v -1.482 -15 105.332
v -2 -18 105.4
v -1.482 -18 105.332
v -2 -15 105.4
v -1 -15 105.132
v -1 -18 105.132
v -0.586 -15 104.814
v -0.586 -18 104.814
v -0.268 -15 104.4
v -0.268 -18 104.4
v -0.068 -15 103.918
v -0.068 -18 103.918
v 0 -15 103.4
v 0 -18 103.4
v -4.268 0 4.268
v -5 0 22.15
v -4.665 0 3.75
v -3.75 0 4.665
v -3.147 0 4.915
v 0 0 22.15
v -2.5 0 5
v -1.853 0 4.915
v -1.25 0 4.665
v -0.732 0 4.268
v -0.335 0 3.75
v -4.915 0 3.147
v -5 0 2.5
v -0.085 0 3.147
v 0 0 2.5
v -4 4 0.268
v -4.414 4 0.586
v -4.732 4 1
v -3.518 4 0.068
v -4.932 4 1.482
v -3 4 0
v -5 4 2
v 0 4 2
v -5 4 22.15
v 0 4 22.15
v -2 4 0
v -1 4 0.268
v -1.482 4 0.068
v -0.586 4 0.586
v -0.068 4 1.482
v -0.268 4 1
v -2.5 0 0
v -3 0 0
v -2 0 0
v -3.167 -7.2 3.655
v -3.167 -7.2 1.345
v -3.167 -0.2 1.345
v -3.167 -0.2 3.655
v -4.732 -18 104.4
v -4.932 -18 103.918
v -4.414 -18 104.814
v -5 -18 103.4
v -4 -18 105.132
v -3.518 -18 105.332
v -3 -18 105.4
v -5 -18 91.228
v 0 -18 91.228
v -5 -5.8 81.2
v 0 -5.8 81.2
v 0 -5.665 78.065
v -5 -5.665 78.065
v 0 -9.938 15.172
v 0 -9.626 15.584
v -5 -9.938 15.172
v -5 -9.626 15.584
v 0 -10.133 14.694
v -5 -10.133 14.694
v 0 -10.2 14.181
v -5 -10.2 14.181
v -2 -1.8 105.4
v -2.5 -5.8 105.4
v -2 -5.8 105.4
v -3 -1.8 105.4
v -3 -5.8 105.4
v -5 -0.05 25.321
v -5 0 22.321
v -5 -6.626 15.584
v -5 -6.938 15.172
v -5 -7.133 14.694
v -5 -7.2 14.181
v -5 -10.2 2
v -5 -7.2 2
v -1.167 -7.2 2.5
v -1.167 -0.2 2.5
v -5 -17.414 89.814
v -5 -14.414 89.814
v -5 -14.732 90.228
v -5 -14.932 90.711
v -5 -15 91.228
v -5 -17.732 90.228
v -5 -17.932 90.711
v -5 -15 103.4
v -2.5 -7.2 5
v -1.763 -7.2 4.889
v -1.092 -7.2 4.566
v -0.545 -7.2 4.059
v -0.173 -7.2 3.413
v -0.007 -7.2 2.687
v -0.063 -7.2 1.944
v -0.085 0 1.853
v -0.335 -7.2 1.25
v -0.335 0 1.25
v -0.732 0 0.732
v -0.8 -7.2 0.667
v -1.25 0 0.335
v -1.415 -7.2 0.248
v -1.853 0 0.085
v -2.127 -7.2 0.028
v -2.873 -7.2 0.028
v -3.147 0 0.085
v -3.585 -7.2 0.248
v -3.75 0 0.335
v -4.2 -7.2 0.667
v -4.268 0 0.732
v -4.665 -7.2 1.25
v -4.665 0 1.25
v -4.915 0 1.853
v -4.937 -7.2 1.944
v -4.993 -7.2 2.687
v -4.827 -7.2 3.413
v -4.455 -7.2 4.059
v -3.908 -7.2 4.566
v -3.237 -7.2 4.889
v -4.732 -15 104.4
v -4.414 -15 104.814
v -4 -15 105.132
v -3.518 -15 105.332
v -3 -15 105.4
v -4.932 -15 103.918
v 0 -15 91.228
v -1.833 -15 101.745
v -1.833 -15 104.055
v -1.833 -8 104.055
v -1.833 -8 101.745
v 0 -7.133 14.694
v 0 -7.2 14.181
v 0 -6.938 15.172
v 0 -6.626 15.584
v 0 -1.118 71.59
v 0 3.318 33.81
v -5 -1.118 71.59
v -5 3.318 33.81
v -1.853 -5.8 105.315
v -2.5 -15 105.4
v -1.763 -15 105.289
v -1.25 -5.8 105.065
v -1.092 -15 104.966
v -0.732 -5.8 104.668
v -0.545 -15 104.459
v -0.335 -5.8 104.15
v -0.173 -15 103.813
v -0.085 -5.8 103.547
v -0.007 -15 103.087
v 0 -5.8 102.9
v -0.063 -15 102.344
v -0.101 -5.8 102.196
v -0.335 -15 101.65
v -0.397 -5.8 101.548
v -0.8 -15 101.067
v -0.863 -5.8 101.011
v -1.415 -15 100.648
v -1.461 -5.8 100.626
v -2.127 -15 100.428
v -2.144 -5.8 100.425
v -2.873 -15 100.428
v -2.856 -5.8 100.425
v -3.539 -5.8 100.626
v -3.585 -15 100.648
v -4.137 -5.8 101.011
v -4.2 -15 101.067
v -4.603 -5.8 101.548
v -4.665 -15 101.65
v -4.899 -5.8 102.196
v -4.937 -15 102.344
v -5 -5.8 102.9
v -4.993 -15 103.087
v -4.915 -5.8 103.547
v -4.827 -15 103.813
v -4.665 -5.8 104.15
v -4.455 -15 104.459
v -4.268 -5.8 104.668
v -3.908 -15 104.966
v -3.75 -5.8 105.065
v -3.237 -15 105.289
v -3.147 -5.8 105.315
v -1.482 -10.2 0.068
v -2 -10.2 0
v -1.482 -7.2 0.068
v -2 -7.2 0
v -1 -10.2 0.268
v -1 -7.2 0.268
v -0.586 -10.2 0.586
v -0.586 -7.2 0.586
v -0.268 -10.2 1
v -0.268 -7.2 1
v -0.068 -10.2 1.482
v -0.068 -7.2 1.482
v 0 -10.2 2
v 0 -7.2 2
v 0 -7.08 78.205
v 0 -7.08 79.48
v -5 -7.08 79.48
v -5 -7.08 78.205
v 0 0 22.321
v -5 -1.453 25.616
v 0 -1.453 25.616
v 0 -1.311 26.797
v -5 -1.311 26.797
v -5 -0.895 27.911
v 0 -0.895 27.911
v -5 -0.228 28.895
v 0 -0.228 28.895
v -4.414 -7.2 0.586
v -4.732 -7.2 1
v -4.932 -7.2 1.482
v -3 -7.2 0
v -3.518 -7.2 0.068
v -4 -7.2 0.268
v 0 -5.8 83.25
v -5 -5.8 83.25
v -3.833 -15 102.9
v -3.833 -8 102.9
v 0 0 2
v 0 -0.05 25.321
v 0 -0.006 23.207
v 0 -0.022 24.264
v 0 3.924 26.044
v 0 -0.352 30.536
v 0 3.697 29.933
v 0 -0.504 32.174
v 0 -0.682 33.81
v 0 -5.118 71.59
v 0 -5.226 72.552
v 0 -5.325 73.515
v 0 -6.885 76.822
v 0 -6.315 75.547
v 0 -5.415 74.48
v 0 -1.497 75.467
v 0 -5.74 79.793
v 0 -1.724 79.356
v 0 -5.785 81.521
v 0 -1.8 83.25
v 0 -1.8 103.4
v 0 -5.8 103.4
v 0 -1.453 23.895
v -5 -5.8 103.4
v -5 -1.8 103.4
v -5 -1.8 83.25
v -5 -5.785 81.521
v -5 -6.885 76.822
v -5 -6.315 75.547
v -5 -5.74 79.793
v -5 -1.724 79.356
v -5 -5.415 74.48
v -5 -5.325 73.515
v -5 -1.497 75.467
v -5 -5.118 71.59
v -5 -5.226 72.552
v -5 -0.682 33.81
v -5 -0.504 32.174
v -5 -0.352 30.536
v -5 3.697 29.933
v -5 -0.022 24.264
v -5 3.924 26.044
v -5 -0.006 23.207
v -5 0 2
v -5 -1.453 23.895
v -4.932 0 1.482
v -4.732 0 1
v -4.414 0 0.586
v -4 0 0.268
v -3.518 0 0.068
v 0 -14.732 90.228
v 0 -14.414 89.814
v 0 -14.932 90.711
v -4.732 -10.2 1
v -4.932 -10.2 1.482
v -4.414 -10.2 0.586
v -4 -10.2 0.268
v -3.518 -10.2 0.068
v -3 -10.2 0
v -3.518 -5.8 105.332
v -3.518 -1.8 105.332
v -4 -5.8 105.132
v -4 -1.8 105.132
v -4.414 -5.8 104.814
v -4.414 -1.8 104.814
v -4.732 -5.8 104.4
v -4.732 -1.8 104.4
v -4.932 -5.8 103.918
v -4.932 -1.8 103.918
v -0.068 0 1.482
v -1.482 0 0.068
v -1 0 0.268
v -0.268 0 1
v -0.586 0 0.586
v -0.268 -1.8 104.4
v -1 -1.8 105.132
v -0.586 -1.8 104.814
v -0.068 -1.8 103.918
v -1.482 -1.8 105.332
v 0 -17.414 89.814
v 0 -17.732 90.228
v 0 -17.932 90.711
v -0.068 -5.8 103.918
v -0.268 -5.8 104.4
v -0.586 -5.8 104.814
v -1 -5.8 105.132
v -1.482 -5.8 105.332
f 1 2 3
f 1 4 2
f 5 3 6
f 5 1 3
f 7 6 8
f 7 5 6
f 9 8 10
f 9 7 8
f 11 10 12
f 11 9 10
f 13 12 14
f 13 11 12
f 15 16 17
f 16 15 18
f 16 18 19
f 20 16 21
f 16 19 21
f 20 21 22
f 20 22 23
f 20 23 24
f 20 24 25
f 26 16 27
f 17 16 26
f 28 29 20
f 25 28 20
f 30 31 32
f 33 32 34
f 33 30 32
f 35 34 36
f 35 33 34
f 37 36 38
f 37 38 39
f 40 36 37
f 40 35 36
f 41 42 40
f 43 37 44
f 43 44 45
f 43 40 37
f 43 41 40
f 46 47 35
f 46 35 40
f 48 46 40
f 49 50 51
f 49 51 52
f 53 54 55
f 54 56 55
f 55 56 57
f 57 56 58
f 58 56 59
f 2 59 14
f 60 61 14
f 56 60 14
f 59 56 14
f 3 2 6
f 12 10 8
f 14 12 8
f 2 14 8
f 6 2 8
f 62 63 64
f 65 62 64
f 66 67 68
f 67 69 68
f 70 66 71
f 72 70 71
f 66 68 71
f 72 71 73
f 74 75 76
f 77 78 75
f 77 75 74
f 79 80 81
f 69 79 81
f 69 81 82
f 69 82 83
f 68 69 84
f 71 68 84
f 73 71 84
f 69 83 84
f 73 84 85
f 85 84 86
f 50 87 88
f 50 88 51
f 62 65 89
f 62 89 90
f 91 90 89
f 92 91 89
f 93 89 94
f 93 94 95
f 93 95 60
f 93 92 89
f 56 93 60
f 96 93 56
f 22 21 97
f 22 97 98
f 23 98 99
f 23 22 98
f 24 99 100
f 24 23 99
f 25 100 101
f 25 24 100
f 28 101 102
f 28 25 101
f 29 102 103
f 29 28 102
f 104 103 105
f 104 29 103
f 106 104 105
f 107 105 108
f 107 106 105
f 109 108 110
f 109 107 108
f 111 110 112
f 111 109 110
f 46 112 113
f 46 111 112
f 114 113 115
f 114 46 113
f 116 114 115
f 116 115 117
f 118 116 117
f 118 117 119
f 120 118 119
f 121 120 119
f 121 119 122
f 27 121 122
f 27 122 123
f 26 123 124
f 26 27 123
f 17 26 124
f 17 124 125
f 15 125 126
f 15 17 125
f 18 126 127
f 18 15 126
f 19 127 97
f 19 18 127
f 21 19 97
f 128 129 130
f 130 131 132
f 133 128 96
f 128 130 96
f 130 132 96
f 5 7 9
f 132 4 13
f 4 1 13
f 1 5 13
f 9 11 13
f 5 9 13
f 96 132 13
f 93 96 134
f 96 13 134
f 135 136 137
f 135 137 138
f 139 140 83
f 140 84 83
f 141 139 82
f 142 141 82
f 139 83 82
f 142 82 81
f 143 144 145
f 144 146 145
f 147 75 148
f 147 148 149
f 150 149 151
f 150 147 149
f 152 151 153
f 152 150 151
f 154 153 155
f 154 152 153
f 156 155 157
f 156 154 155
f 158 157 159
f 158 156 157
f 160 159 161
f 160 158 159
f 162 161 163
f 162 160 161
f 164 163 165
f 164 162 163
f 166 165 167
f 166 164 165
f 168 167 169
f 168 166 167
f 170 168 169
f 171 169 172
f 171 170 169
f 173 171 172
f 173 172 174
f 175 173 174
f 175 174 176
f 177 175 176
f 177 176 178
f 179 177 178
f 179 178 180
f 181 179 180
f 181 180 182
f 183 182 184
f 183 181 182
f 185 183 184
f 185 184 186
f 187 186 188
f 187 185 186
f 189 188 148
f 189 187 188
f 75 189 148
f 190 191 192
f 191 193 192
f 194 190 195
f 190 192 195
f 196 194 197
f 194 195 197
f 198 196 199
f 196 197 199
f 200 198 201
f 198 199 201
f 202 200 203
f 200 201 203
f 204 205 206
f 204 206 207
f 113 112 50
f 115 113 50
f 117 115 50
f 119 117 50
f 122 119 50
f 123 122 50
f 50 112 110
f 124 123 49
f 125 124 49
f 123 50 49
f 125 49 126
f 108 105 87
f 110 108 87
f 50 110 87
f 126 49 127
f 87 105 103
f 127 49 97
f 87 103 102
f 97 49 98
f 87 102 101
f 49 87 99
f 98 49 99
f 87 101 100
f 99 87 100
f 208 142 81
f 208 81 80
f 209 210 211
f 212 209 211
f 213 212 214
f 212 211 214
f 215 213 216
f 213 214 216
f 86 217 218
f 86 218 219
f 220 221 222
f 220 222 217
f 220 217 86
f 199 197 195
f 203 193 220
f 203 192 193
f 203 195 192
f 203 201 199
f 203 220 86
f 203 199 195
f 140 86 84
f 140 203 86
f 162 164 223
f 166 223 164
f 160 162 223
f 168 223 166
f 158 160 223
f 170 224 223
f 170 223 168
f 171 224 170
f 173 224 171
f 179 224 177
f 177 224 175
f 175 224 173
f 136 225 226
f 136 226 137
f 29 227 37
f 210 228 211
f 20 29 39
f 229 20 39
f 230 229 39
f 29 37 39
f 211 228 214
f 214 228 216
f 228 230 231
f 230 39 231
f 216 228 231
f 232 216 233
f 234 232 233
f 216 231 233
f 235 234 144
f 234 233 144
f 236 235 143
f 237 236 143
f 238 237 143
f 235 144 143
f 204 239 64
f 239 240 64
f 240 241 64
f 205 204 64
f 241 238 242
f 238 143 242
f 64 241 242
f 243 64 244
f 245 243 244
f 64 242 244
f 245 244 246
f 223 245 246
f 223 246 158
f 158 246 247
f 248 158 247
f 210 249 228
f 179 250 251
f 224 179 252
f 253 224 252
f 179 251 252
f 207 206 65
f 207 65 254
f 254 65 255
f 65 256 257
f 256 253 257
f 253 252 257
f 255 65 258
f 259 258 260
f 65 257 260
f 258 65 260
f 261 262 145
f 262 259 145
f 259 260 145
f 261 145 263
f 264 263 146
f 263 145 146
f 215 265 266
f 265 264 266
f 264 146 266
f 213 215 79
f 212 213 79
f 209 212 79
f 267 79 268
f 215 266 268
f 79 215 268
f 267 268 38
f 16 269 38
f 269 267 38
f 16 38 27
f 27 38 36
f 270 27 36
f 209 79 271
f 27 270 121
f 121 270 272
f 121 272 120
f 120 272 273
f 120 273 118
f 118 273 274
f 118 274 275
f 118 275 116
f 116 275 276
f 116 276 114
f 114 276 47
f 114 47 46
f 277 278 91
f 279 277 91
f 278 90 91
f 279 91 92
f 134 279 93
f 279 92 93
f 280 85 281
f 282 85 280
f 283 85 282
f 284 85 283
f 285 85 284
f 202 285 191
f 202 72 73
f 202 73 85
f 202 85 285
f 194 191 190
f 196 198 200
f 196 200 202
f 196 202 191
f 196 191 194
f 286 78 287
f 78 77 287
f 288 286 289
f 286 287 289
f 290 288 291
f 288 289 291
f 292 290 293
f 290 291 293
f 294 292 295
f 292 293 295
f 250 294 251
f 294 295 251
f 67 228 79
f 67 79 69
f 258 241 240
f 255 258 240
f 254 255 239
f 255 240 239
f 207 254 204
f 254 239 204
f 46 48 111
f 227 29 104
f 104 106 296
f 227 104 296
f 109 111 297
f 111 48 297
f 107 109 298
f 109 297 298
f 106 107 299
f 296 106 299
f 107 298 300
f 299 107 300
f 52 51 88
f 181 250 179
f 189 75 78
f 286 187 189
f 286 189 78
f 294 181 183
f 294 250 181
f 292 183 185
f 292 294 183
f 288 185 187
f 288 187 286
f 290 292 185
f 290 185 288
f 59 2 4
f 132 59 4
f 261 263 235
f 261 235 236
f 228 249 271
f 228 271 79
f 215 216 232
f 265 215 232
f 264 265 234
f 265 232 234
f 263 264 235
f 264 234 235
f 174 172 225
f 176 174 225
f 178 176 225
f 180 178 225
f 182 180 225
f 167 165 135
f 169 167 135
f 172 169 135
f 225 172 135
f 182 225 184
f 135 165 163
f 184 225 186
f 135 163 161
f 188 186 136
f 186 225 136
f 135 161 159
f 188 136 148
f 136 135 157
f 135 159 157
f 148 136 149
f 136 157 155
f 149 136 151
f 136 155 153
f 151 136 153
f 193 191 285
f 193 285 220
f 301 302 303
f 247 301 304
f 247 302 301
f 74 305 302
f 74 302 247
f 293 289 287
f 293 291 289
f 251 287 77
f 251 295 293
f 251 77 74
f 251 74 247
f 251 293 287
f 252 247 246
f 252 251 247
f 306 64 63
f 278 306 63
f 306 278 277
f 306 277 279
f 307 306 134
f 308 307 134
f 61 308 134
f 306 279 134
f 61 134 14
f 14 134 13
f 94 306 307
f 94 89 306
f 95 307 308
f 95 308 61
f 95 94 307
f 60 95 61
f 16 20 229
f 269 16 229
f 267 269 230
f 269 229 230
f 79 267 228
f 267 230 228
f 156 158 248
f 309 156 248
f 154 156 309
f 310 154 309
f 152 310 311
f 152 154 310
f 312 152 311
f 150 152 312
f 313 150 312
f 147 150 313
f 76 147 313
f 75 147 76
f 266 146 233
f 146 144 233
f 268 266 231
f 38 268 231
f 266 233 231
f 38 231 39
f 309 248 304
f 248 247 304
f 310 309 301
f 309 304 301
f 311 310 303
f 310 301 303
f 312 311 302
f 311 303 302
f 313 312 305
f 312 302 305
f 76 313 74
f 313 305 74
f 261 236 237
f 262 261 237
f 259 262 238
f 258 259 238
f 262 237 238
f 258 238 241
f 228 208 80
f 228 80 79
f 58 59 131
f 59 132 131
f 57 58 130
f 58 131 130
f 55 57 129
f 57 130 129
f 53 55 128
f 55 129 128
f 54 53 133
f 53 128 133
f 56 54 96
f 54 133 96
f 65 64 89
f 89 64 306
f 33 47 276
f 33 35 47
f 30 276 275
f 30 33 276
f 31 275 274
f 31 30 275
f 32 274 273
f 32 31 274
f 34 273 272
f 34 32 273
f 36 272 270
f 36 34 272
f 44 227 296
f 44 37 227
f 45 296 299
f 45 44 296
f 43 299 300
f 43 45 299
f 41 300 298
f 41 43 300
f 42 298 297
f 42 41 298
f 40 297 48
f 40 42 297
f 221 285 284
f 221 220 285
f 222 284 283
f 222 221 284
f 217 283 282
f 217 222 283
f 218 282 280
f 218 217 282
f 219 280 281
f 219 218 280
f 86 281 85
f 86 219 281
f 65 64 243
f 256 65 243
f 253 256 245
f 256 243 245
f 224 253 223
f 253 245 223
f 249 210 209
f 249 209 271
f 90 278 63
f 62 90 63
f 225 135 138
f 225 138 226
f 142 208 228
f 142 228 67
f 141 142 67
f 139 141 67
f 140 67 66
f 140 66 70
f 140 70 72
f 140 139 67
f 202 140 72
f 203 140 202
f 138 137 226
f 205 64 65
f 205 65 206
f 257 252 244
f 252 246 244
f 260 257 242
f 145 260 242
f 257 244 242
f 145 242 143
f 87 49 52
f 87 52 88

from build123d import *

# Parameters (mm, degrees)
SKETCH1_W             = 5
SKETCH1_H             = 105.4
BOSS_EXTRUDE1_DEPTH   = 4
SKETCH1_3_R           = 2.5
BOSS_EXTRUDE2_DEPTH   = 15
SKETCH1_4_R           = 2.5
BOSS_EXTRUDE3_DEPTH   = 7.2
FILLET1_R             = 1
CUT_EXTRUDE1_DEPTH    = 7
CUT_EXTRUDE2_DEPTH    = 7
BOSS_EXTRUDE4_DEPTH   = 5
CUT_EXTRUDE3_DEPTH    = 5
FILLET2_R             = 100
BOSS_EXTRUDE6_DEPTH   = 5
BOSS_EXTRUDE6_2_DEPTH = 5
BOSS_EXTRUDE7_DEPTH   = 5
FILLET3_R             = 5
FILLET4_R             = 2
FILLET5_R             = 2
FILLET6_R             = 2


with BuildPart() as part:
    # Sketch1 → Boss-Extrude1 (new body)
    with BuildSketch(Plane(origin=(0, 0, 0), x_dir=(1, 0, 0), z_dir=(0, 1, 0))):
        with Locations((-2.5, -52.7)):
            Rectangle(SKETCH1_W, SKETCH1_H)
    extrude(amount=BOSS_EXTRUDE1_DEPTH)

    # Sketch1<3> → Boss-Extrude2 (add)
    with BuildSketch(Plane(origin=(0, 0, 0), x_dir=(1, 0, 0), z_dir=(0, 1, 0))):
        with Locations(Location((-2.5, -102.9, 0), (0, 0, 270))):
            Circle(SKETCH1_3_R)
    extrude(amount=-BOSS_EXTRUDE2_DEPTH)

    # Sketch1<4> → Boss-Extrude3 (add)
    with BuildSketch(Plane(origin=(0, 0, 0), x_dir=(1, 0, 0), z_dir=(0, 1, 0))):
        with Locations(Location((-2.5, -2.5, 0), (0, 0, 270))):
            Circle(SKETCH1_4_R)
    extrude(amount=-BOSS_EXTRUDE3_DEPTH)

    # Fillet1
    fillet1_edges = [part.edges().sort_by_distance(p)[0] for p in [
        (0, 2, 105.4),
        (-5, 2, 105.4),
    ]]
    fillet(fillet1_edges, radius=FILLET1_R)

    # Sketch2 → Cut-Extrude1 (cut)
    with BuildSketch(Plane.XZ.offset(15)):
        Polygon((-1.833333333, 104.054700538), (-1.833333333, 101.745299462), (-3.833333333, 102.9), align=None)
    extrude(amount=-CUT_EXTRUDE1_DEPTH, mode=Mode.SUBTRACT)

    # Sketch3 → Cut-Extrude2 (cut)
    with BuildSketch(Plane(origin=(0, -7.2, 0), x_dir=(-1, 0, 0), z_dir=(0, -1, 0))):
        Polygon((3.166666667, -1.345299462), (3.166666667, -3.654700538), (1.166666667, -2.5), align=None)
    extrude(amount=-CUT_EXTRUDE2_DEPTH, mode=Mode.SUBTRACT)

    # Sketch4 → Boss-Extrude4 (add)
    with BuildSketch(Plane.ZY.offset(5)):
        Polygon((105.4, -5.8), (105.4, -1.8), (77.4, -1.8), (28, 4), (28, 0), (77.4, -5.8), align=None)
    extrude(amount=-BOSS_EXTRUDE4_DEPTH)

    # Sketch4<4> → Cut-Extrude3 (cut)
    with BuildSketch(Plane.ZY.offset(5)):
        Polygon((77.4, -1.8), (105.4, -1.8), (105.4, 4), (28, 4), align=None)
    extrude(amount=-CUT_EXTRUDE3_DEPTH, mode=Mode.SUBTRACT)

    # Fillet2
    fillet2_edges = [part.edges().sort_by_distance(p)[0] for p in [
        (-2.5, 4, 28),
        (-2.5, -1.8, 77.4),
        (-2.5, -5.8, 77.4),
        (-2.5, 0, 28),
    ]]
    fillet(fillet2_edges, radius=FILLET2_R)

    # Sketch6 → Boss-Extrude7 (add)
    with BuildSketch(Plane(origin=(0, 0, 0), x_dir=(0, 0, -1), z_dir=(1, 0, 0))):
        Polygon((-74.479709397, -5.414636547), (-78.065495835, -5.665495835), (-79.479709397, -7.079709397), (-74.479709397, -7.079709397), align=None)
        with BuildLine():
            ThreePointArc((-25.320806157, -0.050293893), (-27.108607835, -0.123032137), (-28.89482189, -0.227746249))
            Line((-28.89482189, -0.227746249), (-28.89482189, -1.452637955))
            Line((-28.89482189, -1.452637955), (-23.89482189, -1.452637955))
            Line((-23.89482189, -1.452637955), (-25.320806157, -0.050293893))
        make_face()
    extrude(amount=-BOSS_EXTRUDE7_DEPTH)

    # Fillet3
    # the kernel refuses this fillet: 5 mm, written as the material it takes off along each edge
    with BuildSketch(Plane(origin=(9.313384489, -7.079709397, 74.479709397), x_dir=(0, 1, 0), z_dir=(-1, 0, 0))) as fillet3_piece_1:
        with BuildLine():
            CenterArc((5, -3.725353796), FILLET3_R, 131.834823038, 48.165176962)
            Line((0, -3.725353796), (-0.1, -3.725353796))
            Line((-0.1, -3.725353796), (-0.1, 0))
            Line((-0.1, 0), (0, 0.1))
            ThreePointArc((0, 0.1), (0.832536425, 0.1), (1.598374307, 0.074507076))
            Line((1.598374307, 0.074507076), (1.66507285, 0))
        make_face()
    extrude(amount=23.626768978, mode=Mode.SUBTRACT)
    with BuildSketch(Plane(origin=(8.196248138, -1.452637955, 28.89482189), x_dir=(0, 1, 0), z_dir=(-1, 0, 0))) as fillet3_piece_2:
        with BuildLine():
            CenterArc((5, 3.278499255), FILLET3_R, 180, 40.972737691)
            Line((0, 3.278499255), (-0.1, 3.278499255))
            Line((-0.1, 3.278499255), (-0.1, 0))
            Line((-0.1, 0), (0, -0.1))
            ThreePointArc((0, -0.1), (0.612445853, -0.1), (1.14938954, -0.065569985))
            Line((1.14938954, -0.065569985), (1.224891706, 0))
        make_face()
    extrude(amount=21.392496276, mode=Mode.SUBTRACT)

    # Fillet5
    fillet5_edges = [part.edges().sort_by_distance(p)[0] for p in [
        (0, -3.8, 105.4),
        (-5, -3.8, 105.4),
        (0, 2, 0),
        (-5, 2, 0),
    ]]
    fillet(fillet5_edges, radius=FILLET5_R)


with BuildPart() as body_2:
    # Sketch5 → Boss-Extrude6 (new body)
    with BuildSketch(Plane(origin=(0, 0, 0), x_dir=(0, 0, -1), z_dir=(1, 0, 0))):
        Polygon((-90.4, -15), (-81.2, -5.8), (-78.065495835, -5.665495835), (-90.4, -18), (-105.4, -18), (-105.4, -15), align=None)
    extrude(amount=-BOSS_EXTRUDE6_DEPTH)

    # Fillet6
    fillet6_edges = [body_2.edges().sort_by_distance(p)[0] for p in [
        (-2.5, -18, 90.4),
        (-2.5, -15, 90.4),
        (-5, -16.5, 105.4),
        (0, -16.5, 105.4),
    ]]
    fillet(fillet6_edges, radius=FILLET6_R)


with BuildPart() as body_3:
    # Sketch5 → Boss-Extrude6 2 (new body)
    with BuildSketch(Plane(origin=(0, 0, 0), x_dir=(0, 0, -1), z_dir=(1, 0, 0))):
        Polygon((0, -7.2), (-15, -7.2), (-22.321225302, -0.000147195), (-25.320806157, -0.050293893), (-15, -10.2), (0, -10.2), align=None)
    extrude(amount=-BOSS_EXTRUDE6_2_DEPTH)

    # Fillet4
    fillet4_edges = [body_3.edges().sort_by_distance(p)[0] for p in [
        (-2.5, -7.2, 15),
        (-2.5, -10.2, 15),
        (-5, -8.7, 0),
        (0, -8.7, 0),
    ]]
    fillet(fillet4_edges, radius=FILLET4_R)


solid = Compound([part.part, body_2.part, body_3.part])
